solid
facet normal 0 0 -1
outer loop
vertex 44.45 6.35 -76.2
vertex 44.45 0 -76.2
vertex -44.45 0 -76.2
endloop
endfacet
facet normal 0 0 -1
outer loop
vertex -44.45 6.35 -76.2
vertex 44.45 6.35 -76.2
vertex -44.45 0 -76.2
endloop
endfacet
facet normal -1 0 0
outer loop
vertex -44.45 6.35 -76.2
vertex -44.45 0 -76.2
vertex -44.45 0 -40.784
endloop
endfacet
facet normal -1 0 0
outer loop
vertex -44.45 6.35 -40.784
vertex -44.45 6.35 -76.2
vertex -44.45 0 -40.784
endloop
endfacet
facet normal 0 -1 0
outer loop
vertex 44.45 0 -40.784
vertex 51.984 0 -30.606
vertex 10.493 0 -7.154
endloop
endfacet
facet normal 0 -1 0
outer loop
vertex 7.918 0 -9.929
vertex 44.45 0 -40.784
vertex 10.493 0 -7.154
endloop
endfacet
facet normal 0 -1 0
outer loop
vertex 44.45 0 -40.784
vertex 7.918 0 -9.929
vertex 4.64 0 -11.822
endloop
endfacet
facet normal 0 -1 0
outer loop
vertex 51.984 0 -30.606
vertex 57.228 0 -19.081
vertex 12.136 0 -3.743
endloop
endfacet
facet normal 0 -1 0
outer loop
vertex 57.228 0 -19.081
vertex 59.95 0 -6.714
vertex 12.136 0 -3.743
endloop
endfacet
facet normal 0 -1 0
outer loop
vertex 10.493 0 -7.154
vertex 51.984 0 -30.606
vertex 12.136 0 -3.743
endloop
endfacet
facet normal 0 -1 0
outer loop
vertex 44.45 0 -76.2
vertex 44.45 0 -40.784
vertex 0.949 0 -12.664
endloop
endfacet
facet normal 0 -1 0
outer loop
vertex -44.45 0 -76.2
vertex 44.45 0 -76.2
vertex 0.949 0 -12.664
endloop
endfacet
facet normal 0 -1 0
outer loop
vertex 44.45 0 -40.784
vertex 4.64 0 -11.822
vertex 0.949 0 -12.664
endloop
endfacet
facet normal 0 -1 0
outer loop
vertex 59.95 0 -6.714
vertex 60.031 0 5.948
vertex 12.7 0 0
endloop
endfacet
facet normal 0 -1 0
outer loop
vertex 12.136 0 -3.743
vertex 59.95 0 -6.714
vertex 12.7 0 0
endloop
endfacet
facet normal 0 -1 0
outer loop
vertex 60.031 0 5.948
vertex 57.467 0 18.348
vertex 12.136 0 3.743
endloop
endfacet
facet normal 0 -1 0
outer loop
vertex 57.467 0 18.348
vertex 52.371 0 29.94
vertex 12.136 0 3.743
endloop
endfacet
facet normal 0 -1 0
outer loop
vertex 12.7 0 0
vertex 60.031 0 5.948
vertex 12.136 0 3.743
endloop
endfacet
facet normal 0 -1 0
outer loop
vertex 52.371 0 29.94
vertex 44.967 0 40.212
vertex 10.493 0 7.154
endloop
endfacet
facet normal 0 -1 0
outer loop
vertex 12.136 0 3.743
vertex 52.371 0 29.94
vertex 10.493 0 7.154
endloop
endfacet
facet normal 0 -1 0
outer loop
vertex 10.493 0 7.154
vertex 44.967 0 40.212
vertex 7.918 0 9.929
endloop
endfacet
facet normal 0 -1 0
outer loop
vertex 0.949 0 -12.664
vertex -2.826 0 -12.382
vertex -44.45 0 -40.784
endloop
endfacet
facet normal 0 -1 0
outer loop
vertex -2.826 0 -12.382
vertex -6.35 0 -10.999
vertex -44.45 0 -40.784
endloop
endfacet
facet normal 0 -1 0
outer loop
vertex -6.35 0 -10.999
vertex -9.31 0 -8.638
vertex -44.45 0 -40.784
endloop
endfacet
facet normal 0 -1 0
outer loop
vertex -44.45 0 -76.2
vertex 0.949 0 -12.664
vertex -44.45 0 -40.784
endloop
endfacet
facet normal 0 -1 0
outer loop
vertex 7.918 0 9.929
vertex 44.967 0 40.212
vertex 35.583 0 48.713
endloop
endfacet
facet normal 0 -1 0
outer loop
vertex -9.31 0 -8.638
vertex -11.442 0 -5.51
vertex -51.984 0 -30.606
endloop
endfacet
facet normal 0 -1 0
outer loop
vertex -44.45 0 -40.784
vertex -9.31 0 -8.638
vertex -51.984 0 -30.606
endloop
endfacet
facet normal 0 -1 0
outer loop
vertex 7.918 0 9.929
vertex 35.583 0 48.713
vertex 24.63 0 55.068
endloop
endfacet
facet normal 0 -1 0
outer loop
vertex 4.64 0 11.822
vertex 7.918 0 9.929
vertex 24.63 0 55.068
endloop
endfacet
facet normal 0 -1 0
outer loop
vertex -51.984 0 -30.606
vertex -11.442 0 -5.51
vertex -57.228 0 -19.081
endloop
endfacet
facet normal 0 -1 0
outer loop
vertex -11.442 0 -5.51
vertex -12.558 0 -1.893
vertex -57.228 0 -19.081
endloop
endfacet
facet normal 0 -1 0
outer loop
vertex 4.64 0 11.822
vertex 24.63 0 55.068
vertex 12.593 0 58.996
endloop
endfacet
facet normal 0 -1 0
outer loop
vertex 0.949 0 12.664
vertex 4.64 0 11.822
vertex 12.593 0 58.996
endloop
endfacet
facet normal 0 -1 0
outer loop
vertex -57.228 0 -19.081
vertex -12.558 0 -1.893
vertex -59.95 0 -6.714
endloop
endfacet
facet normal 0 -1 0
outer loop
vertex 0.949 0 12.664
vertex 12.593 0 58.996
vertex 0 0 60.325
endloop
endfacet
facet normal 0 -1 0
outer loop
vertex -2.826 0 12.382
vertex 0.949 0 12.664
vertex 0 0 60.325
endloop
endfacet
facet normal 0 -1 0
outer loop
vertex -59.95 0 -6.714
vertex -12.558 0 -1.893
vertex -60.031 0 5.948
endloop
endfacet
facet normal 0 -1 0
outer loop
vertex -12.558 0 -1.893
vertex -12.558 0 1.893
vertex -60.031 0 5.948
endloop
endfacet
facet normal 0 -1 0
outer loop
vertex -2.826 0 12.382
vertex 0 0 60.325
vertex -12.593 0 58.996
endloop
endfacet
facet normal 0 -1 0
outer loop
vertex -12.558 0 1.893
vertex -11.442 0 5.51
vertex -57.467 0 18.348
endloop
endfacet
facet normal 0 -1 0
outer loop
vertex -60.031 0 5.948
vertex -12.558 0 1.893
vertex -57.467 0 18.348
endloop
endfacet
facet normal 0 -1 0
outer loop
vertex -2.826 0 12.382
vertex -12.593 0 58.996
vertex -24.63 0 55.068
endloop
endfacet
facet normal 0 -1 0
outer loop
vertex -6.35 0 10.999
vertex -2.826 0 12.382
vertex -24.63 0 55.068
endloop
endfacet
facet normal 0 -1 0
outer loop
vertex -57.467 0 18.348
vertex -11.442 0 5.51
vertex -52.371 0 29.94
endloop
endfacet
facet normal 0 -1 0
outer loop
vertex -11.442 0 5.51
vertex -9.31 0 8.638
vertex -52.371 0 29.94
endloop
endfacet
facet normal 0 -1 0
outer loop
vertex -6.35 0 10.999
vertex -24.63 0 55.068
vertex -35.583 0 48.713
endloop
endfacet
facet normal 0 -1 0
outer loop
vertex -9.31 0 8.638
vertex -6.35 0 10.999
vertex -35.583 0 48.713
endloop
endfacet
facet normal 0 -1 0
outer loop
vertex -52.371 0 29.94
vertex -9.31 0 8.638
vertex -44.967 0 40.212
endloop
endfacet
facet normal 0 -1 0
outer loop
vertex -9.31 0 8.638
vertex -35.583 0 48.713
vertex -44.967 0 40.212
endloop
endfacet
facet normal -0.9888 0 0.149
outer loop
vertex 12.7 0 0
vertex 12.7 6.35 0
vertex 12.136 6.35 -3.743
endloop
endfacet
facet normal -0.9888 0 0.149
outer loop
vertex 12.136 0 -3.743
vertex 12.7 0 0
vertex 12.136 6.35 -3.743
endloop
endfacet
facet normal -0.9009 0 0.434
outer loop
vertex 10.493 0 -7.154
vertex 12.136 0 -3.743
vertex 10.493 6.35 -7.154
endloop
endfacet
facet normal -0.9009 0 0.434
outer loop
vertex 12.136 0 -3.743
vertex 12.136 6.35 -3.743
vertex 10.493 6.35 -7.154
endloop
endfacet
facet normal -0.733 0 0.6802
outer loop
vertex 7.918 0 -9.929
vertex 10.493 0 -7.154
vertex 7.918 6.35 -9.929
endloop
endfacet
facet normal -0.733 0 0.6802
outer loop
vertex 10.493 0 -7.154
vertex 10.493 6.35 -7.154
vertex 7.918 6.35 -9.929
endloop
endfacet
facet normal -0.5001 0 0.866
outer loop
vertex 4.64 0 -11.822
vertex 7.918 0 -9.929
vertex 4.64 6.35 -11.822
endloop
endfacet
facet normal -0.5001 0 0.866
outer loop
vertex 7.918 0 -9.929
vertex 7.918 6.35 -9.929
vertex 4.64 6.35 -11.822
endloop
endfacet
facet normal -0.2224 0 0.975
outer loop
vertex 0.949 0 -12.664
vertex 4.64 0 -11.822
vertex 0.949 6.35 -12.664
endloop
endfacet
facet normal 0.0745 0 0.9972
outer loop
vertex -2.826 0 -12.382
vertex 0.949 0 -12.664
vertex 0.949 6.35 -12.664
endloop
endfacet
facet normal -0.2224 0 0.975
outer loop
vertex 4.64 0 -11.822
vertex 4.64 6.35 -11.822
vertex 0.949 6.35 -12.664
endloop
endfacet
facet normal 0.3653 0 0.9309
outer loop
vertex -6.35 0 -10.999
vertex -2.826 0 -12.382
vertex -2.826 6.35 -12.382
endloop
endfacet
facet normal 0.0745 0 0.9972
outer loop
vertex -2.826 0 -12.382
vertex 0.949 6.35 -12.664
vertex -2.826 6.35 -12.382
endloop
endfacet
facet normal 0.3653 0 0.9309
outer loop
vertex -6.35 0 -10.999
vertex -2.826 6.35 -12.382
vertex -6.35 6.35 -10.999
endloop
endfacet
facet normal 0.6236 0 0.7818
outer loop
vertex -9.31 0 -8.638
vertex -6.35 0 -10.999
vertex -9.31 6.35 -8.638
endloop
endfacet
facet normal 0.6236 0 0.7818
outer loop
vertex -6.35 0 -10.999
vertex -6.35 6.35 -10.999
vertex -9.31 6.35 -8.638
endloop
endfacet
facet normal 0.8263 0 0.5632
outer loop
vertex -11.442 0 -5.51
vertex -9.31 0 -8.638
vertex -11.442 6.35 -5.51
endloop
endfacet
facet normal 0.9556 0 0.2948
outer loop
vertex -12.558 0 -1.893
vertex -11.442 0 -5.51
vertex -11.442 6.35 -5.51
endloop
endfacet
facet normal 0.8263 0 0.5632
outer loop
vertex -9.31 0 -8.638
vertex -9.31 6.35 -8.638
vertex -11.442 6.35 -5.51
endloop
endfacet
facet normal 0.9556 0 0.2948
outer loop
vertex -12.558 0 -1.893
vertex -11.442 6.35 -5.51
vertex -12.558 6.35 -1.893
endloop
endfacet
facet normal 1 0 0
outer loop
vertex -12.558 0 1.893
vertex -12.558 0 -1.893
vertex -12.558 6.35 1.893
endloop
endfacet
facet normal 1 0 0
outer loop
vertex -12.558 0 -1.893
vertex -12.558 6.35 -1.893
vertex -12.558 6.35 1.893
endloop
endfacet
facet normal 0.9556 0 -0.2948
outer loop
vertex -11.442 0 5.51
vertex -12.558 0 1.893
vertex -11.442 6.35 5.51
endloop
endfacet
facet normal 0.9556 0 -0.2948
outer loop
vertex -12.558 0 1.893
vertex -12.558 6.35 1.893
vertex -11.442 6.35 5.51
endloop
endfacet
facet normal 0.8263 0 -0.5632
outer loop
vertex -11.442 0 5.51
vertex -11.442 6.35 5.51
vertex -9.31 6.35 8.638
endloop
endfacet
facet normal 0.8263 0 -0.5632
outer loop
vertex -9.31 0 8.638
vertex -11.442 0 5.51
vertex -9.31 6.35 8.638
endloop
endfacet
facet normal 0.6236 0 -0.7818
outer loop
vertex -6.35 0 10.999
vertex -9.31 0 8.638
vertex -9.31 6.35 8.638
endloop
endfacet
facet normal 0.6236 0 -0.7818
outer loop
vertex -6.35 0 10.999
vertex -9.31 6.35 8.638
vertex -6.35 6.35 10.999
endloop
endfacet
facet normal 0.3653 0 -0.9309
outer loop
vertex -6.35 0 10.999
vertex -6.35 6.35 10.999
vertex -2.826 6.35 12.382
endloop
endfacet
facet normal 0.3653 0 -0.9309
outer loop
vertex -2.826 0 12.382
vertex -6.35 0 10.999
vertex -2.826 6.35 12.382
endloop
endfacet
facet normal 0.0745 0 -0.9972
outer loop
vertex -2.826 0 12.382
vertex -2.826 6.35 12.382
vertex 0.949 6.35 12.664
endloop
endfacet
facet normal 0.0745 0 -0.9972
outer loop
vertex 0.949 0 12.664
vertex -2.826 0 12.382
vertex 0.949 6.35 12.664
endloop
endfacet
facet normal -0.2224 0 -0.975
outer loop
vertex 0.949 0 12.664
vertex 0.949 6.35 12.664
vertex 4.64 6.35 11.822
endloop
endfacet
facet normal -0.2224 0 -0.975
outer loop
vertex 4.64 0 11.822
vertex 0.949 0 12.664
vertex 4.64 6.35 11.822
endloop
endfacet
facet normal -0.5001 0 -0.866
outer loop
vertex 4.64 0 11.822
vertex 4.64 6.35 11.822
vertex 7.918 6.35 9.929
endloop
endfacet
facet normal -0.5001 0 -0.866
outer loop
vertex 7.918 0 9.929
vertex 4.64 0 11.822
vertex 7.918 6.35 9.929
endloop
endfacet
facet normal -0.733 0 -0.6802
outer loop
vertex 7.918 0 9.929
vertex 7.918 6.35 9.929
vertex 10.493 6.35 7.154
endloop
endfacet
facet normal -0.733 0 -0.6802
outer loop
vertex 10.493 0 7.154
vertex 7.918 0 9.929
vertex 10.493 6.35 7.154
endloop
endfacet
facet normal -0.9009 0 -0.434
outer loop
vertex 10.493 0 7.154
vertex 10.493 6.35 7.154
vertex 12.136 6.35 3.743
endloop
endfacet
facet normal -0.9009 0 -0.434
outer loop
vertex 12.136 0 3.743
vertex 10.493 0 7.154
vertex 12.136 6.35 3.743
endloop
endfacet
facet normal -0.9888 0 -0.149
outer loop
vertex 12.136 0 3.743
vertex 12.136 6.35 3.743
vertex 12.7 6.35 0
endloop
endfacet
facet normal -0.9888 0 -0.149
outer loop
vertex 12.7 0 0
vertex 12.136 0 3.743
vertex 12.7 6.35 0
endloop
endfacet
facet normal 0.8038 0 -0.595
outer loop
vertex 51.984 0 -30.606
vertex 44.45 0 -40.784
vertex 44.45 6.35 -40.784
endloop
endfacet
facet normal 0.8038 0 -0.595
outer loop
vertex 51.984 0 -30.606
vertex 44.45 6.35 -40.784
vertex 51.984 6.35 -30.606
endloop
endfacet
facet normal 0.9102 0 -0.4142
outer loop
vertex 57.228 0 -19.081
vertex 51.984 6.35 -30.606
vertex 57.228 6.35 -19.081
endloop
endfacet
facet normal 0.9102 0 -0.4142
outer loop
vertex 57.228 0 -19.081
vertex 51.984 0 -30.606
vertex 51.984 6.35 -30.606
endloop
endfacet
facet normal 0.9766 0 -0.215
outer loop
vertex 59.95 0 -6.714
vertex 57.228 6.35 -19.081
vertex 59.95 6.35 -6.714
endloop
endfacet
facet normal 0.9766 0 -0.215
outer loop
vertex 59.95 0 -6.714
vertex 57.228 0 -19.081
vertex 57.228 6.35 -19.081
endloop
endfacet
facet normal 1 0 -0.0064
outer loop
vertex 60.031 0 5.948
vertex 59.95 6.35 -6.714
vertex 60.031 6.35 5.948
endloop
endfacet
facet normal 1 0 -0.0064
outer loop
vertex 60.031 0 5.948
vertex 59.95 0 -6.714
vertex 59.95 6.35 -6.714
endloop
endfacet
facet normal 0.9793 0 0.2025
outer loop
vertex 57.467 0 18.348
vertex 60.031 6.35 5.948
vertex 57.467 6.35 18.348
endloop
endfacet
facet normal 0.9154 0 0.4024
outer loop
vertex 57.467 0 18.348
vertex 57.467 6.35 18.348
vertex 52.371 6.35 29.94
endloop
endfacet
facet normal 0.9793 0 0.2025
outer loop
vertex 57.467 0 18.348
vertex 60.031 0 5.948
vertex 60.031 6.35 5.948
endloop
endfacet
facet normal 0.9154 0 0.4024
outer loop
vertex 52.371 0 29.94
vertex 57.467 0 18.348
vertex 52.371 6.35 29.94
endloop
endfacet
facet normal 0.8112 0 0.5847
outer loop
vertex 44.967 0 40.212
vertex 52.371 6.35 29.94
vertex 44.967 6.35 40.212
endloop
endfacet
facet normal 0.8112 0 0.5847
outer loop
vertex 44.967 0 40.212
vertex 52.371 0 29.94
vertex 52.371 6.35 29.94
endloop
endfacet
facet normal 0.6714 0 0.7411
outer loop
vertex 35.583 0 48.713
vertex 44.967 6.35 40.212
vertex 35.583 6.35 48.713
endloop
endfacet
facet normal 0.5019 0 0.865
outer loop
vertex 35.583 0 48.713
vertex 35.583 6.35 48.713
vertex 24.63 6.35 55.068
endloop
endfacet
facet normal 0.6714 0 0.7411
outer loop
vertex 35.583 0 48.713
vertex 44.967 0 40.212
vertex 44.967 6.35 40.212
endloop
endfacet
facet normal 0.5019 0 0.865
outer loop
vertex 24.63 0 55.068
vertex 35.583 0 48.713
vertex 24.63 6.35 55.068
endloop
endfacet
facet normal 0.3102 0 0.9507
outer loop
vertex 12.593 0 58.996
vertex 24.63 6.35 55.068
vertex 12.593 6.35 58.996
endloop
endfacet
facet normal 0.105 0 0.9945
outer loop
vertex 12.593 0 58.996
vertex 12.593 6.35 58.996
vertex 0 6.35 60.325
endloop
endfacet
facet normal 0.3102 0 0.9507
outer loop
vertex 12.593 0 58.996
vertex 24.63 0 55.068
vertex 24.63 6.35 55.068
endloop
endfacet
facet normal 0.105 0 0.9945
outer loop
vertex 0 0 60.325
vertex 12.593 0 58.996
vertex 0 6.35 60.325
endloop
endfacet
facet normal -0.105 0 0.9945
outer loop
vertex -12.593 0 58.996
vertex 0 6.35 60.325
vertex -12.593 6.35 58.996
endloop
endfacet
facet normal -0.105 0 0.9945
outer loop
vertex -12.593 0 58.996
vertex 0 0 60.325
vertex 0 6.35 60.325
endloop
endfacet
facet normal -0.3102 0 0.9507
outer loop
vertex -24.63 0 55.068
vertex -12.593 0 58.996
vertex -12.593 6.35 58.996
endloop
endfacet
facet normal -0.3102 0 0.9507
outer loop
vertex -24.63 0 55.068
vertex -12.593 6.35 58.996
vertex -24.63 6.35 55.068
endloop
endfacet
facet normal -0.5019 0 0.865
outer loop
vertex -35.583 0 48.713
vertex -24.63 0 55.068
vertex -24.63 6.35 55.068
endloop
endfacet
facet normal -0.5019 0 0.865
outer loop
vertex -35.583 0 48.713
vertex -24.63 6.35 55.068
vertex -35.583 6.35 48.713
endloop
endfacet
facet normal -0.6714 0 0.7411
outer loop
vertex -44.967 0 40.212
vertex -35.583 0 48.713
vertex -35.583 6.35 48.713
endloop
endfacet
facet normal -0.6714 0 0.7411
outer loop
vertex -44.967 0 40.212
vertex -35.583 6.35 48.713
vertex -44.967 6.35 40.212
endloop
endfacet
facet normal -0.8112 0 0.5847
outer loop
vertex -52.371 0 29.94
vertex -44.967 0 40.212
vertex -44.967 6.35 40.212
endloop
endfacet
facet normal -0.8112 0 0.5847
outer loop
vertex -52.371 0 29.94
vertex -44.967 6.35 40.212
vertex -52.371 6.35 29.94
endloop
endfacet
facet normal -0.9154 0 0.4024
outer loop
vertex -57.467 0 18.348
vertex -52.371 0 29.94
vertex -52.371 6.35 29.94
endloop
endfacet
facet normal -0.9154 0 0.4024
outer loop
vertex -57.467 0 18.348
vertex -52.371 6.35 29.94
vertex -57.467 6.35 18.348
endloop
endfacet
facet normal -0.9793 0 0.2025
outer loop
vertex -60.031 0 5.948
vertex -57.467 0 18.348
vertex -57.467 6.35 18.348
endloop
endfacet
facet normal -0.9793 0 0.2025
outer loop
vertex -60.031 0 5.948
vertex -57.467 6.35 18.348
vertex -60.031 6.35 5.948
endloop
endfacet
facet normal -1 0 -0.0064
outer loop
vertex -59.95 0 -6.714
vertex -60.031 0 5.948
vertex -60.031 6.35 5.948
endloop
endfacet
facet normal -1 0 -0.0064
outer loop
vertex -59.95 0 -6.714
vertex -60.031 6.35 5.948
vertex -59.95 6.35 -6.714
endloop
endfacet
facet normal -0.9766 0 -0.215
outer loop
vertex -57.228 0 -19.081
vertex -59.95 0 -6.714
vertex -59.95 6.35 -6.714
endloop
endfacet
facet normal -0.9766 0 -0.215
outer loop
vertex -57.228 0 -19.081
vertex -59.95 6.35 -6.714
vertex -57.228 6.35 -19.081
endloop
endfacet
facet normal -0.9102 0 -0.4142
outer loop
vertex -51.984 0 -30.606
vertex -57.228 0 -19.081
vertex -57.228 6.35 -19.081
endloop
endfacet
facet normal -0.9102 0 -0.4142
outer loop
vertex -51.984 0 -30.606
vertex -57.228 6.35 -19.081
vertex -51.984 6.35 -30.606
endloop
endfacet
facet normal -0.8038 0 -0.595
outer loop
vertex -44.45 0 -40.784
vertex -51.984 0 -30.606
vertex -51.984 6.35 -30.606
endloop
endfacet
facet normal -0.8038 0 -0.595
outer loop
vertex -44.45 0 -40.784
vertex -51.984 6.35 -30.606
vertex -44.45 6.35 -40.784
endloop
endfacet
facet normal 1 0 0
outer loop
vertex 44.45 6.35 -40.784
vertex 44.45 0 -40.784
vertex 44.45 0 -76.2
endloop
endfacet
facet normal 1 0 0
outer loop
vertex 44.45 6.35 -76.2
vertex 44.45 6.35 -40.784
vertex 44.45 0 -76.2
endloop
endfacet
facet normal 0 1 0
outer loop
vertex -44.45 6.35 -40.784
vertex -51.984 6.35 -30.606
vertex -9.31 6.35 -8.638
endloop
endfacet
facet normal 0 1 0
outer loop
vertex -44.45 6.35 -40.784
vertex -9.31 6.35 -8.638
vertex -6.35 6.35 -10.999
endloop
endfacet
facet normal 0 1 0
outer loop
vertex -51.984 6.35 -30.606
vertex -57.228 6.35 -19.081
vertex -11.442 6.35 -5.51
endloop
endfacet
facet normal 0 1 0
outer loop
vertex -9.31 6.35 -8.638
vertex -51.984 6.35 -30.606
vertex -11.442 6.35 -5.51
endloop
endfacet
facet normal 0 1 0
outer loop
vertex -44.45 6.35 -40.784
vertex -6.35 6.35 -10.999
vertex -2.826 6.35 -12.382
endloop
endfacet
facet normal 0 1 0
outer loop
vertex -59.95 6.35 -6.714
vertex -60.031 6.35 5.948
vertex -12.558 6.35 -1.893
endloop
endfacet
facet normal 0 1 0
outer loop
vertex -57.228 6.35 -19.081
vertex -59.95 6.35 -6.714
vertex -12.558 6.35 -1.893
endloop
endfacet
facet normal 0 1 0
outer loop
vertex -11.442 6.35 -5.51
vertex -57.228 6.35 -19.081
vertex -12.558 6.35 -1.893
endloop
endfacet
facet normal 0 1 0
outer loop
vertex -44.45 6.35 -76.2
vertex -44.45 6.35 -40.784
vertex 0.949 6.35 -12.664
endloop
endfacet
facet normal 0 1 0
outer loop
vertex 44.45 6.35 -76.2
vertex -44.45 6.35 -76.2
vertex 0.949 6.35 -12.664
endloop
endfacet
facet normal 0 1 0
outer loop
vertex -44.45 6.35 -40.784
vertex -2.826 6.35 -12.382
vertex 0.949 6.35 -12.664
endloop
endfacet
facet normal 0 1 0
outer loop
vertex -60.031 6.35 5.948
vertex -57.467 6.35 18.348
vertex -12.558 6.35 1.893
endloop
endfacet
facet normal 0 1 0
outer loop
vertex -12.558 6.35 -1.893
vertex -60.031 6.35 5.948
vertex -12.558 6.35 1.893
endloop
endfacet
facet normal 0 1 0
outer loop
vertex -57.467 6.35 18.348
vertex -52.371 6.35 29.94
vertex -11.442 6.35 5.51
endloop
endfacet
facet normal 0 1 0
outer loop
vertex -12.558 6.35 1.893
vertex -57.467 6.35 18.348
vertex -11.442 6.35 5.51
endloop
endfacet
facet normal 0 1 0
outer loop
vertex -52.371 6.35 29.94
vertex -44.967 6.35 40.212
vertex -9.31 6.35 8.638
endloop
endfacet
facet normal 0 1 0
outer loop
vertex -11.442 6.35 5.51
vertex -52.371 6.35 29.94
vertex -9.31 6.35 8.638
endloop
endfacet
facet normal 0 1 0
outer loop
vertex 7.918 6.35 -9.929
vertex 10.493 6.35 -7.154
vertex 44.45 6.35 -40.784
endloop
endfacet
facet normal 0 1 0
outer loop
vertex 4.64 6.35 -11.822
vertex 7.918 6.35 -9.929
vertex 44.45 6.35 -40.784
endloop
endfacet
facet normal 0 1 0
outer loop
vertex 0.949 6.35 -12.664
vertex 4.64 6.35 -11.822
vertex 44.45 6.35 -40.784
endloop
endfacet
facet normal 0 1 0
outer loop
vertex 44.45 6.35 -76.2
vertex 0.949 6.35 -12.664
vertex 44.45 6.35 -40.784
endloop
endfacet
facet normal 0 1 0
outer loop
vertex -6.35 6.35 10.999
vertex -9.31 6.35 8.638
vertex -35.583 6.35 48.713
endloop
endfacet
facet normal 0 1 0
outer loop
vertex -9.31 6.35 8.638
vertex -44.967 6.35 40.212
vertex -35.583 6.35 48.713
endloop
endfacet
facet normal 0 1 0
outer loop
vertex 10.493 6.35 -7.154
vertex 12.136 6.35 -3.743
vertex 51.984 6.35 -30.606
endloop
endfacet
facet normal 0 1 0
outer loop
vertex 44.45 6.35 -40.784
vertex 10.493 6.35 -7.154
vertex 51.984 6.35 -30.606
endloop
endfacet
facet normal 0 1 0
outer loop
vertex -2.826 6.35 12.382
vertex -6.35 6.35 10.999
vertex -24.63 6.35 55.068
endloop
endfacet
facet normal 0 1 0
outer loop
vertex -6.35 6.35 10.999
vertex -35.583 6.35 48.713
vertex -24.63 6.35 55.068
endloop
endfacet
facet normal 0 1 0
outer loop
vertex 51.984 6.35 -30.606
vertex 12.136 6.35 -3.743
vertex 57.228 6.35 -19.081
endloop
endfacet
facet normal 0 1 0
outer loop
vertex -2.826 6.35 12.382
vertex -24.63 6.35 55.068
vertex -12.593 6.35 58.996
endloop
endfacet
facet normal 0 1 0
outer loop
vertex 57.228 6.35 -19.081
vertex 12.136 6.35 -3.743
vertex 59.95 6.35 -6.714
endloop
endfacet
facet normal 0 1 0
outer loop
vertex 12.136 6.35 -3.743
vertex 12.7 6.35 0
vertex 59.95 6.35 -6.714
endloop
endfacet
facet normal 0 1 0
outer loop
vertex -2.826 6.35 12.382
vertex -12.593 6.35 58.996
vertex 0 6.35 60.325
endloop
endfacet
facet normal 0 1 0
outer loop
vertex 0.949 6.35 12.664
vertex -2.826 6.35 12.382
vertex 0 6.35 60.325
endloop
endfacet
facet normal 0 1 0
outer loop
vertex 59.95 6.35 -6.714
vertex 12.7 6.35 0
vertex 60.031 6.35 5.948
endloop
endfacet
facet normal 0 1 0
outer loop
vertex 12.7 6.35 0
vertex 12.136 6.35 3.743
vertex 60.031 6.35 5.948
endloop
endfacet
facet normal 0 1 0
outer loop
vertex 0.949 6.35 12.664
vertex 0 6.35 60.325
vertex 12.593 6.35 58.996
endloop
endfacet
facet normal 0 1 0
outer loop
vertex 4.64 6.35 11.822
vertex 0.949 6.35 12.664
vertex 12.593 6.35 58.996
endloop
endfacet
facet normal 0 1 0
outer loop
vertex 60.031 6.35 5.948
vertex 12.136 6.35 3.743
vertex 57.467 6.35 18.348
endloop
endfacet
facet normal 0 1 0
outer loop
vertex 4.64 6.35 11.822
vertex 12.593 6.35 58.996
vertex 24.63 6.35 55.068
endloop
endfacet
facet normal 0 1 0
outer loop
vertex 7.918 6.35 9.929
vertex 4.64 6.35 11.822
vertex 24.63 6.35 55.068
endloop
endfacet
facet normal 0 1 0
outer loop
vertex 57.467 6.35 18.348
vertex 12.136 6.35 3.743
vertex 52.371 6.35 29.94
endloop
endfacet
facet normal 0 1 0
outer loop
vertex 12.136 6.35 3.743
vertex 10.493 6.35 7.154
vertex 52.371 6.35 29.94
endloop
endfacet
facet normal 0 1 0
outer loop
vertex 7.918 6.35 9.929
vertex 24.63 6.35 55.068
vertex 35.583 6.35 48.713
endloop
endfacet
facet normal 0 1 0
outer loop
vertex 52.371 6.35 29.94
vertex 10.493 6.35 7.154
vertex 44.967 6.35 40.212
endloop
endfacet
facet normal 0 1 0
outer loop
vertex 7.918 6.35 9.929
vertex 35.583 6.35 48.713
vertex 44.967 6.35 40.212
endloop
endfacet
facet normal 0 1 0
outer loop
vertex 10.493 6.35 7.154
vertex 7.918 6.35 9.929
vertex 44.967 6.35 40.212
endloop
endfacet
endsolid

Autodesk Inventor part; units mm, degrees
ref_plane "YZ Plane" through (0, 0, 0) normal (1, 0, 0) x (0, 1, 0)
ref_plane "XZ Plane" through (0, 0, 0) normal (0, 1, 0) x (-1, 0, 0)
ref_plane "XY Plane" through (0, 0, 0) normal (0, 0, 1) x (1, 0, 0)
sketch "Sketch1" plane through (0, 0, 0) normal (0, 1, 0) x (-1, 0, 0)
  arc A0 (38.1, -38.2321) -> (-38.1, -38.2321) centre (0, 0) ccw
  line L0 (0, 0) -> (0, -72.7817) construction
  line L1 (-38.1, -38.2321) -> (-38.1, -69.85)
  line L2 (-38.1, -69.85) -> (0, -69.85)
  line L3 (0, -69.85) -> (38.1, -69.85)
  line L4 (38.1, -69.85) -> (38.1, -38.2321)
  dimension "d0" = 107.95
  dimension "d6" = 69.85
  dimension "d7" = 38.1
extrude "Extrusion1" add sketch "Sketch1" along normal blind 6.35
sketch "Sketch3" plane through (0, 0, 0) normal (0, -1, 0) x (1, 0, 0)
  arc A0 (38.1, -38.2321) -> (-38.1, -38.2321) centre (0, 0) ccw projected
  line L0 (38.1, -38.2321) -> (38.1, -69.85) projected
  line L1 (38.1, -69.85) -> (-38.1, -69.85) projected
  line L2 (-38.1, -69.85) -> (-38.1, -38.2321) projected
  arc A1 (38.1, -38.2321) -> (-38.1, -38.2321) centre (0, 0) ccw
  line L3 (38.1, -38.2321) -> (38.1, -69.85) projected
  line L4 (38.1, -38.2321) -> (38.1, -69.85)
  line L5 (38.1, -69.85) -> (-38.1, -69.85)
  line L6 (-38.1, -69.85) -> (-38.1, -38.2321) projected
  line L7 (-38.1, -69.85) -> (-38.1, -38.2321)
  arc A2 (44.45, -40.7836) -> (-44.45, -40.7836) centre (0, 0) ccw
  line L8 (44.45, -40.7836) -> (44.45, -76.2)
  line L9 (44.45, -76.2) -> (-44.45, -76.2)
  line L10 (-44.45, -76.2) -> (-44.45, -40.7836)
  dimension "d8" = 6.35
  dimension "d9" = 6.35
  dimension "d10" = 6.35
  dimension "d11" = 6.35
extrude "Extrusion4" add sketch "Sketch3" against normal blind 6.35
sketch "Sketch5" plane through (0, 6.35, 0) normal (0, 1, 0) x (1, 0, 0)
  circle A0 centre (0, 0) radius 12.7
  dimension "d24" = 25.4
extrude "Extrusion7" cut sketch "Sketch5" against normal through all
equation "\"d0\" = exteriorDiameter"
equation "\"exteriorDiameter\" = 107.95"
properties part number "baseSupportCover"
